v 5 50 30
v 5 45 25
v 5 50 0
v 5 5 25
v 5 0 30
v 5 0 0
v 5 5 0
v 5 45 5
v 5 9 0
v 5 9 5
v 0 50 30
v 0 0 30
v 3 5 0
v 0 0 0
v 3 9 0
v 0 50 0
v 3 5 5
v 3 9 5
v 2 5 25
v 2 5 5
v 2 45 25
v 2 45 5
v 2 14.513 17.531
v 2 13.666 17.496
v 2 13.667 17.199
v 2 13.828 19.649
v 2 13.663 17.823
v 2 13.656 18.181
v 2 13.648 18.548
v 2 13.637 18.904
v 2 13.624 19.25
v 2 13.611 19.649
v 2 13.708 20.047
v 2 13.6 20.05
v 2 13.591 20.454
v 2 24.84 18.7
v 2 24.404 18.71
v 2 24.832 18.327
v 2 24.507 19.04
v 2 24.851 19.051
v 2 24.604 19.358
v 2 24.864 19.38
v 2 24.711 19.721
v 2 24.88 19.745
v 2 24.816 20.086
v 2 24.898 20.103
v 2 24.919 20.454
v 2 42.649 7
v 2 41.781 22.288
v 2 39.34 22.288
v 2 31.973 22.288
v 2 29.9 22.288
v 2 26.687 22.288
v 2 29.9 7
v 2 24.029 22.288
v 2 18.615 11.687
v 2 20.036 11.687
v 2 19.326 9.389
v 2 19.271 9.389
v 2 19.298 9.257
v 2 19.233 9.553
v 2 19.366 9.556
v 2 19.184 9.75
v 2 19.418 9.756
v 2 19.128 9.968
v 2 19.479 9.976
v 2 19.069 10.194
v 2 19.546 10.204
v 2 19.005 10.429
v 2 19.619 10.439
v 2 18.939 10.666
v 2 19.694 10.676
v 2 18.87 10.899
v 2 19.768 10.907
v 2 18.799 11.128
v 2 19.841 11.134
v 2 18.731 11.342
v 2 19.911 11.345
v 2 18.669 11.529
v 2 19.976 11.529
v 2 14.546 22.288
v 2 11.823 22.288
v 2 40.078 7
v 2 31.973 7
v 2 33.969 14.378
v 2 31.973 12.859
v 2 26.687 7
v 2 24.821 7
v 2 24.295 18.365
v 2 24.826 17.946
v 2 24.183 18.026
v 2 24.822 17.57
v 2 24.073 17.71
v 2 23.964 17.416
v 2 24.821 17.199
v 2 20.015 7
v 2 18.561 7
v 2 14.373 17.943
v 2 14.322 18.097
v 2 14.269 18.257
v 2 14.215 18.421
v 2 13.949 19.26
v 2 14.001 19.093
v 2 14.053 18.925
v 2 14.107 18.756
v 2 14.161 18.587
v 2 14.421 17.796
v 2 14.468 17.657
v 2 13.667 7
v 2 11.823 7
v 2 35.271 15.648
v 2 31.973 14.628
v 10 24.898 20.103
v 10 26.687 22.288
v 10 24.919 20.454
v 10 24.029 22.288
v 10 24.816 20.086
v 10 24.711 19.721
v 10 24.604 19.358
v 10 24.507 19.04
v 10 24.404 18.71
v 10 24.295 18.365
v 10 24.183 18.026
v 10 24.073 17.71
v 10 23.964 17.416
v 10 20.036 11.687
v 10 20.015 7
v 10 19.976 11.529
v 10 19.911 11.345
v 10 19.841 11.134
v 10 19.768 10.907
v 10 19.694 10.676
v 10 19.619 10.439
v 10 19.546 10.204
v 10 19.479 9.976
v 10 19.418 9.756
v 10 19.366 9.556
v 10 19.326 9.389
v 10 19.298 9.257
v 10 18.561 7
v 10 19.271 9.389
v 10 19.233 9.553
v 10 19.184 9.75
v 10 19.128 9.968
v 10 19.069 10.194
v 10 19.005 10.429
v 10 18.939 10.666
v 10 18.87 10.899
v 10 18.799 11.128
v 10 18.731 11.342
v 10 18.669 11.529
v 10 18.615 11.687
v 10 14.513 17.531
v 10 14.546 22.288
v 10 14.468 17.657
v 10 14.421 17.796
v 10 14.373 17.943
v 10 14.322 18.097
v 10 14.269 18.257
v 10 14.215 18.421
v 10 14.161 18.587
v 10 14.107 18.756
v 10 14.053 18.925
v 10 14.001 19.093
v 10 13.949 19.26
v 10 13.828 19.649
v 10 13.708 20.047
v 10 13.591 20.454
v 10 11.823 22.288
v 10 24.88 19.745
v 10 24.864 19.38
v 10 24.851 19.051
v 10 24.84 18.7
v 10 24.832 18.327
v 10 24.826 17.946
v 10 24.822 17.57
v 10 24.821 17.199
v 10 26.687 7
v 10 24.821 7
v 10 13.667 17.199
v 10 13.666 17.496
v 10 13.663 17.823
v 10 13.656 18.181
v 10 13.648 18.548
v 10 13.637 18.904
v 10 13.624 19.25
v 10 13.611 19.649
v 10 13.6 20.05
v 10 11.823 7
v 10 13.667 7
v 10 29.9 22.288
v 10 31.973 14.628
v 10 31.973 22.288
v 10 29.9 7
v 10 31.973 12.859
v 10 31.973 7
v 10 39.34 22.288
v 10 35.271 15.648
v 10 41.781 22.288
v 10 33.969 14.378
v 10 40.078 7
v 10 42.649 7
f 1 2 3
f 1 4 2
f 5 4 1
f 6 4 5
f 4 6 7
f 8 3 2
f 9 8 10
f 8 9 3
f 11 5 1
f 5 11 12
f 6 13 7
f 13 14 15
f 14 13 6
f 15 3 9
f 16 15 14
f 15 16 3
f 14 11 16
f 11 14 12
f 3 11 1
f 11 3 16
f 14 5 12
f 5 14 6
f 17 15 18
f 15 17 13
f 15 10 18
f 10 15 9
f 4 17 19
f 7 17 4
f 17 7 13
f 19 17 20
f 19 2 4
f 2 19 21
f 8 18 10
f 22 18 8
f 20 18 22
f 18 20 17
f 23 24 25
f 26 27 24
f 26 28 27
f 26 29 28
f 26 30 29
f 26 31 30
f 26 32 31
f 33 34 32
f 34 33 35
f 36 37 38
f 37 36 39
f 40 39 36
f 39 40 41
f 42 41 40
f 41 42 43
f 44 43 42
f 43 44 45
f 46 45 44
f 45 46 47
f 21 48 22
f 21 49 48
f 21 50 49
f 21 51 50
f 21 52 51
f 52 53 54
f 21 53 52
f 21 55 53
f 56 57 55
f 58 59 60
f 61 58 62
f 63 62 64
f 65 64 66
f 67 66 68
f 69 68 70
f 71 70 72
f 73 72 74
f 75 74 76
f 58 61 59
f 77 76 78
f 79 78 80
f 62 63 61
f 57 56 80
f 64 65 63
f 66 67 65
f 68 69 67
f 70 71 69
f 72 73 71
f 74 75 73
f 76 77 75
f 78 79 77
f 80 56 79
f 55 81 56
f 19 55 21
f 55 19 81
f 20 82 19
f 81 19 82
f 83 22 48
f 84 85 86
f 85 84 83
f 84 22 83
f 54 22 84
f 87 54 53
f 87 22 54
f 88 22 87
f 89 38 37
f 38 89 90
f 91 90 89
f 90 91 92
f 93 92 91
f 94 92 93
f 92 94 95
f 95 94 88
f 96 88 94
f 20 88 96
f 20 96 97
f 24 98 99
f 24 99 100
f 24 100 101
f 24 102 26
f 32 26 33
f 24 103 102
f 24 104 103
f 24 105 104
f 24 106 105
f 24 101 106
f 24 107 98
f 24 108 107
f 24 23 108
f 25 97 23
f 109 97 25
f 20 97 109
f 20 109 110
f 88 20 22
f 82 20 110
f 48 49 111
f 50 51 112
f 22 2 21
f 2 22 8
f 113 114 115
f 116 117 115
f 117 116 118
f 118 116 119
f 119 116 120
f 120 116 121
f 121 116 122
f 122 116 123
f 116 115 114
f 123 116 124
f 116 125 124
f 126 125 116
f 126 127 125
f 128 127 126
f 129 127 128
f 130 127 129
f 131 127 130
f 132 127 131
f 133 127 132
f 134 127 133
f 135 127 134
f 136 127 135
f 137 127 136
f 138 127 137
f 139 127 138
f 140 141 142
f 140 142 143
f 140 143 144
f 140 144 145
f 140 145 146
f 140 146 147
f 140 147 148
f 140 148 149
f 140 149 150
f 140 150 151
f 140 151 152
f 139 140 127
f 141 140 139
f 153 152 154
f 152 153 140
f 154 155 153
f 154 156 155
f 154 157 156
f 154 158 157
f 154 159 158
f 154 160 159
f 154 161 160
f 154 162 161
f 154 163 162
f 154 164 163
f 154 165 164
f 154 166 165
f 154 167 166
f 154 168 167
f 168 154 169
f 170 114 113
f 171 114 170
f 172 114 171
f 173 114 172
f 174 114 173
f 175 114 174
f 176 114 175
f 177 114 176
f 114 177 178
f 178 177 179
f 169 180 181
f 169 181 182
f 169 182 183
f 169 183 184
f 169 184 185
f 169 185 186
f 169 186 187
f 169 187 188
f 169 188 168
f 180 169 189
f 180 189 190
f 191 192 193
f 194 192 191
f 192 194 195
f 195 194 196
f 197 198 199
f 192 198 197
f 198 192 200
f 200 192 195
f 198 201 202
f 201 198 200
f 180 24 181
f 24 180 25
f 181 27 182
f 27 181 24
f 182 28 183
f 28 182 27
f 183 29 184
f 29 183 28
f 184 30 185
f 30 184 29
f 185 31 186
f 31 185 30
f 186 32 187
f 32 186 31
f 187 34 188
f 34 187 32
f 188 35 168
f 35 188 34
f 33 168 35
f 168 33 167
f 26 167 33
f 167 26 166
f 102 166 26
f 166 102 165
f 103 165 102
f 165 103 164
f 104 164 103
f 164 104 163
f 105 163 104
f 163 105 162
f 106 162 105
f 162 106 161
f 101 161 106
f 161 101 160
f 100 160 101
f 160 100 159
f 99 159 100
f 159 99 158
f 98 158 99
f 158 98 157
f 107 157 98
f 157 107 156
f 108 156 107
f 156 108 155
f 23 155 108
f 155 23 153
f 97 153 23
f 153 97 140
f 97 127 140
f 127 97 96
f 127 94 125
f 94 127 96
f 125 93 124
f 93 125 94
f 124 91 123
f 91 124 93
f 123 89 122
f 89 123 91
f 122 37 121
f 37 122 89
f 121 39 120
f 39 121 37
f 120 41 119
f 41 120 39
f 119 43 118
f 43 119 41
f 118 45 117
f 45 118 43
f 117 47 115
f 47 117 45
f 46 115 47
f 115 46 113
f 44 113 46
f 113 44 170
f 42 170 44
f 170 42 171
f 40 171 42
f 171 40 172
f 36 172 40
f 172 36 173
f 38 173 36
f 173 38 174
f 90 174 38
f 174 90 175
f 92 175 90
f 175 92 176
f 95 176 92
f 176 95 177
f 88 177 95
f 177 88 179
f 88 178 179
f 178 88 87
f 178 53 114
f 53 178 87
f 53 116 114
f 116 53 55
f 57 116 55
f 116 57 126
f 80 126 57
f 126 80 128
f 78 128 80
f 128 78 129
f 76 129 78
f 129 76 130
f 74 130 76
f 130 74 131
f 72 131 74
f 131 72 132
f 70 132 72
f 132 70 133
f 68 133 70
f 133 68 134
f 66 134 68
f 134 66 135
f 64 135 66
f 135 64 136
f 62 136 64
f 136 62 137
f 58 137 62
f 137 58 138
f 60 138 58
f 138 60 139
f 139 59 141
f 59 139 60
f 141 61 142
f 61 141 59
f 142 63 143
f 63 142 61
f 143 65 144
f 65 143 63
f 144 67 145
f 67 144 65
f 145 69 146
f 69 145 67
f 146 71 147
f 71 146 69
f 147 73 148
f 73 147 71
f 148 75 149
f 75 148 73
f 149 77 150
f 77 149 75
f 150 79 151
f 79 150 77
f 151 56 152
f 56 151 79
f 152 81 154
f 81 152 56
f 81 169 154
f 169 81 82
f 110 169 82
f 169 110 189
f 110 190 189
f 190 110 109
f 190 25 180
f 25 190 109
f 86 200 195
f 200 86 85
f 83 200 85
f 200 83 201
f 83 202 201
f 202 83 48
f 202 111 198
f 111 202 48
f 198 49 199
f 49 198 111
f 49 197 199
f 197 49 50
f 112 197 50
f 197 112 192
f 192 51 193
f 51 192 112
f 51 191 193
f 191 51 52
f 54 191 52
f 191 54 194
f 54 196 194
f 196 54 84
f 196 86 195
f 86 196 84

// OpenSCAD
$fa=1;
difference()
{
    cube([5,50,30]);
    translate([3,5,0])
        cube([4,4,20]);
    translate([2,5,5])
        cube([6,40,20]);
}

translate([0,10,7])
t("MK");

// Helper to create 3D text with correct font and orientation
module t(t, s = 16, style = "") {
  rotate([90, 0, 90])
    linear_extrude(height = 10)
      text(t, size = s, font = str("Liberation Sans", style), $fn = 16);
}
